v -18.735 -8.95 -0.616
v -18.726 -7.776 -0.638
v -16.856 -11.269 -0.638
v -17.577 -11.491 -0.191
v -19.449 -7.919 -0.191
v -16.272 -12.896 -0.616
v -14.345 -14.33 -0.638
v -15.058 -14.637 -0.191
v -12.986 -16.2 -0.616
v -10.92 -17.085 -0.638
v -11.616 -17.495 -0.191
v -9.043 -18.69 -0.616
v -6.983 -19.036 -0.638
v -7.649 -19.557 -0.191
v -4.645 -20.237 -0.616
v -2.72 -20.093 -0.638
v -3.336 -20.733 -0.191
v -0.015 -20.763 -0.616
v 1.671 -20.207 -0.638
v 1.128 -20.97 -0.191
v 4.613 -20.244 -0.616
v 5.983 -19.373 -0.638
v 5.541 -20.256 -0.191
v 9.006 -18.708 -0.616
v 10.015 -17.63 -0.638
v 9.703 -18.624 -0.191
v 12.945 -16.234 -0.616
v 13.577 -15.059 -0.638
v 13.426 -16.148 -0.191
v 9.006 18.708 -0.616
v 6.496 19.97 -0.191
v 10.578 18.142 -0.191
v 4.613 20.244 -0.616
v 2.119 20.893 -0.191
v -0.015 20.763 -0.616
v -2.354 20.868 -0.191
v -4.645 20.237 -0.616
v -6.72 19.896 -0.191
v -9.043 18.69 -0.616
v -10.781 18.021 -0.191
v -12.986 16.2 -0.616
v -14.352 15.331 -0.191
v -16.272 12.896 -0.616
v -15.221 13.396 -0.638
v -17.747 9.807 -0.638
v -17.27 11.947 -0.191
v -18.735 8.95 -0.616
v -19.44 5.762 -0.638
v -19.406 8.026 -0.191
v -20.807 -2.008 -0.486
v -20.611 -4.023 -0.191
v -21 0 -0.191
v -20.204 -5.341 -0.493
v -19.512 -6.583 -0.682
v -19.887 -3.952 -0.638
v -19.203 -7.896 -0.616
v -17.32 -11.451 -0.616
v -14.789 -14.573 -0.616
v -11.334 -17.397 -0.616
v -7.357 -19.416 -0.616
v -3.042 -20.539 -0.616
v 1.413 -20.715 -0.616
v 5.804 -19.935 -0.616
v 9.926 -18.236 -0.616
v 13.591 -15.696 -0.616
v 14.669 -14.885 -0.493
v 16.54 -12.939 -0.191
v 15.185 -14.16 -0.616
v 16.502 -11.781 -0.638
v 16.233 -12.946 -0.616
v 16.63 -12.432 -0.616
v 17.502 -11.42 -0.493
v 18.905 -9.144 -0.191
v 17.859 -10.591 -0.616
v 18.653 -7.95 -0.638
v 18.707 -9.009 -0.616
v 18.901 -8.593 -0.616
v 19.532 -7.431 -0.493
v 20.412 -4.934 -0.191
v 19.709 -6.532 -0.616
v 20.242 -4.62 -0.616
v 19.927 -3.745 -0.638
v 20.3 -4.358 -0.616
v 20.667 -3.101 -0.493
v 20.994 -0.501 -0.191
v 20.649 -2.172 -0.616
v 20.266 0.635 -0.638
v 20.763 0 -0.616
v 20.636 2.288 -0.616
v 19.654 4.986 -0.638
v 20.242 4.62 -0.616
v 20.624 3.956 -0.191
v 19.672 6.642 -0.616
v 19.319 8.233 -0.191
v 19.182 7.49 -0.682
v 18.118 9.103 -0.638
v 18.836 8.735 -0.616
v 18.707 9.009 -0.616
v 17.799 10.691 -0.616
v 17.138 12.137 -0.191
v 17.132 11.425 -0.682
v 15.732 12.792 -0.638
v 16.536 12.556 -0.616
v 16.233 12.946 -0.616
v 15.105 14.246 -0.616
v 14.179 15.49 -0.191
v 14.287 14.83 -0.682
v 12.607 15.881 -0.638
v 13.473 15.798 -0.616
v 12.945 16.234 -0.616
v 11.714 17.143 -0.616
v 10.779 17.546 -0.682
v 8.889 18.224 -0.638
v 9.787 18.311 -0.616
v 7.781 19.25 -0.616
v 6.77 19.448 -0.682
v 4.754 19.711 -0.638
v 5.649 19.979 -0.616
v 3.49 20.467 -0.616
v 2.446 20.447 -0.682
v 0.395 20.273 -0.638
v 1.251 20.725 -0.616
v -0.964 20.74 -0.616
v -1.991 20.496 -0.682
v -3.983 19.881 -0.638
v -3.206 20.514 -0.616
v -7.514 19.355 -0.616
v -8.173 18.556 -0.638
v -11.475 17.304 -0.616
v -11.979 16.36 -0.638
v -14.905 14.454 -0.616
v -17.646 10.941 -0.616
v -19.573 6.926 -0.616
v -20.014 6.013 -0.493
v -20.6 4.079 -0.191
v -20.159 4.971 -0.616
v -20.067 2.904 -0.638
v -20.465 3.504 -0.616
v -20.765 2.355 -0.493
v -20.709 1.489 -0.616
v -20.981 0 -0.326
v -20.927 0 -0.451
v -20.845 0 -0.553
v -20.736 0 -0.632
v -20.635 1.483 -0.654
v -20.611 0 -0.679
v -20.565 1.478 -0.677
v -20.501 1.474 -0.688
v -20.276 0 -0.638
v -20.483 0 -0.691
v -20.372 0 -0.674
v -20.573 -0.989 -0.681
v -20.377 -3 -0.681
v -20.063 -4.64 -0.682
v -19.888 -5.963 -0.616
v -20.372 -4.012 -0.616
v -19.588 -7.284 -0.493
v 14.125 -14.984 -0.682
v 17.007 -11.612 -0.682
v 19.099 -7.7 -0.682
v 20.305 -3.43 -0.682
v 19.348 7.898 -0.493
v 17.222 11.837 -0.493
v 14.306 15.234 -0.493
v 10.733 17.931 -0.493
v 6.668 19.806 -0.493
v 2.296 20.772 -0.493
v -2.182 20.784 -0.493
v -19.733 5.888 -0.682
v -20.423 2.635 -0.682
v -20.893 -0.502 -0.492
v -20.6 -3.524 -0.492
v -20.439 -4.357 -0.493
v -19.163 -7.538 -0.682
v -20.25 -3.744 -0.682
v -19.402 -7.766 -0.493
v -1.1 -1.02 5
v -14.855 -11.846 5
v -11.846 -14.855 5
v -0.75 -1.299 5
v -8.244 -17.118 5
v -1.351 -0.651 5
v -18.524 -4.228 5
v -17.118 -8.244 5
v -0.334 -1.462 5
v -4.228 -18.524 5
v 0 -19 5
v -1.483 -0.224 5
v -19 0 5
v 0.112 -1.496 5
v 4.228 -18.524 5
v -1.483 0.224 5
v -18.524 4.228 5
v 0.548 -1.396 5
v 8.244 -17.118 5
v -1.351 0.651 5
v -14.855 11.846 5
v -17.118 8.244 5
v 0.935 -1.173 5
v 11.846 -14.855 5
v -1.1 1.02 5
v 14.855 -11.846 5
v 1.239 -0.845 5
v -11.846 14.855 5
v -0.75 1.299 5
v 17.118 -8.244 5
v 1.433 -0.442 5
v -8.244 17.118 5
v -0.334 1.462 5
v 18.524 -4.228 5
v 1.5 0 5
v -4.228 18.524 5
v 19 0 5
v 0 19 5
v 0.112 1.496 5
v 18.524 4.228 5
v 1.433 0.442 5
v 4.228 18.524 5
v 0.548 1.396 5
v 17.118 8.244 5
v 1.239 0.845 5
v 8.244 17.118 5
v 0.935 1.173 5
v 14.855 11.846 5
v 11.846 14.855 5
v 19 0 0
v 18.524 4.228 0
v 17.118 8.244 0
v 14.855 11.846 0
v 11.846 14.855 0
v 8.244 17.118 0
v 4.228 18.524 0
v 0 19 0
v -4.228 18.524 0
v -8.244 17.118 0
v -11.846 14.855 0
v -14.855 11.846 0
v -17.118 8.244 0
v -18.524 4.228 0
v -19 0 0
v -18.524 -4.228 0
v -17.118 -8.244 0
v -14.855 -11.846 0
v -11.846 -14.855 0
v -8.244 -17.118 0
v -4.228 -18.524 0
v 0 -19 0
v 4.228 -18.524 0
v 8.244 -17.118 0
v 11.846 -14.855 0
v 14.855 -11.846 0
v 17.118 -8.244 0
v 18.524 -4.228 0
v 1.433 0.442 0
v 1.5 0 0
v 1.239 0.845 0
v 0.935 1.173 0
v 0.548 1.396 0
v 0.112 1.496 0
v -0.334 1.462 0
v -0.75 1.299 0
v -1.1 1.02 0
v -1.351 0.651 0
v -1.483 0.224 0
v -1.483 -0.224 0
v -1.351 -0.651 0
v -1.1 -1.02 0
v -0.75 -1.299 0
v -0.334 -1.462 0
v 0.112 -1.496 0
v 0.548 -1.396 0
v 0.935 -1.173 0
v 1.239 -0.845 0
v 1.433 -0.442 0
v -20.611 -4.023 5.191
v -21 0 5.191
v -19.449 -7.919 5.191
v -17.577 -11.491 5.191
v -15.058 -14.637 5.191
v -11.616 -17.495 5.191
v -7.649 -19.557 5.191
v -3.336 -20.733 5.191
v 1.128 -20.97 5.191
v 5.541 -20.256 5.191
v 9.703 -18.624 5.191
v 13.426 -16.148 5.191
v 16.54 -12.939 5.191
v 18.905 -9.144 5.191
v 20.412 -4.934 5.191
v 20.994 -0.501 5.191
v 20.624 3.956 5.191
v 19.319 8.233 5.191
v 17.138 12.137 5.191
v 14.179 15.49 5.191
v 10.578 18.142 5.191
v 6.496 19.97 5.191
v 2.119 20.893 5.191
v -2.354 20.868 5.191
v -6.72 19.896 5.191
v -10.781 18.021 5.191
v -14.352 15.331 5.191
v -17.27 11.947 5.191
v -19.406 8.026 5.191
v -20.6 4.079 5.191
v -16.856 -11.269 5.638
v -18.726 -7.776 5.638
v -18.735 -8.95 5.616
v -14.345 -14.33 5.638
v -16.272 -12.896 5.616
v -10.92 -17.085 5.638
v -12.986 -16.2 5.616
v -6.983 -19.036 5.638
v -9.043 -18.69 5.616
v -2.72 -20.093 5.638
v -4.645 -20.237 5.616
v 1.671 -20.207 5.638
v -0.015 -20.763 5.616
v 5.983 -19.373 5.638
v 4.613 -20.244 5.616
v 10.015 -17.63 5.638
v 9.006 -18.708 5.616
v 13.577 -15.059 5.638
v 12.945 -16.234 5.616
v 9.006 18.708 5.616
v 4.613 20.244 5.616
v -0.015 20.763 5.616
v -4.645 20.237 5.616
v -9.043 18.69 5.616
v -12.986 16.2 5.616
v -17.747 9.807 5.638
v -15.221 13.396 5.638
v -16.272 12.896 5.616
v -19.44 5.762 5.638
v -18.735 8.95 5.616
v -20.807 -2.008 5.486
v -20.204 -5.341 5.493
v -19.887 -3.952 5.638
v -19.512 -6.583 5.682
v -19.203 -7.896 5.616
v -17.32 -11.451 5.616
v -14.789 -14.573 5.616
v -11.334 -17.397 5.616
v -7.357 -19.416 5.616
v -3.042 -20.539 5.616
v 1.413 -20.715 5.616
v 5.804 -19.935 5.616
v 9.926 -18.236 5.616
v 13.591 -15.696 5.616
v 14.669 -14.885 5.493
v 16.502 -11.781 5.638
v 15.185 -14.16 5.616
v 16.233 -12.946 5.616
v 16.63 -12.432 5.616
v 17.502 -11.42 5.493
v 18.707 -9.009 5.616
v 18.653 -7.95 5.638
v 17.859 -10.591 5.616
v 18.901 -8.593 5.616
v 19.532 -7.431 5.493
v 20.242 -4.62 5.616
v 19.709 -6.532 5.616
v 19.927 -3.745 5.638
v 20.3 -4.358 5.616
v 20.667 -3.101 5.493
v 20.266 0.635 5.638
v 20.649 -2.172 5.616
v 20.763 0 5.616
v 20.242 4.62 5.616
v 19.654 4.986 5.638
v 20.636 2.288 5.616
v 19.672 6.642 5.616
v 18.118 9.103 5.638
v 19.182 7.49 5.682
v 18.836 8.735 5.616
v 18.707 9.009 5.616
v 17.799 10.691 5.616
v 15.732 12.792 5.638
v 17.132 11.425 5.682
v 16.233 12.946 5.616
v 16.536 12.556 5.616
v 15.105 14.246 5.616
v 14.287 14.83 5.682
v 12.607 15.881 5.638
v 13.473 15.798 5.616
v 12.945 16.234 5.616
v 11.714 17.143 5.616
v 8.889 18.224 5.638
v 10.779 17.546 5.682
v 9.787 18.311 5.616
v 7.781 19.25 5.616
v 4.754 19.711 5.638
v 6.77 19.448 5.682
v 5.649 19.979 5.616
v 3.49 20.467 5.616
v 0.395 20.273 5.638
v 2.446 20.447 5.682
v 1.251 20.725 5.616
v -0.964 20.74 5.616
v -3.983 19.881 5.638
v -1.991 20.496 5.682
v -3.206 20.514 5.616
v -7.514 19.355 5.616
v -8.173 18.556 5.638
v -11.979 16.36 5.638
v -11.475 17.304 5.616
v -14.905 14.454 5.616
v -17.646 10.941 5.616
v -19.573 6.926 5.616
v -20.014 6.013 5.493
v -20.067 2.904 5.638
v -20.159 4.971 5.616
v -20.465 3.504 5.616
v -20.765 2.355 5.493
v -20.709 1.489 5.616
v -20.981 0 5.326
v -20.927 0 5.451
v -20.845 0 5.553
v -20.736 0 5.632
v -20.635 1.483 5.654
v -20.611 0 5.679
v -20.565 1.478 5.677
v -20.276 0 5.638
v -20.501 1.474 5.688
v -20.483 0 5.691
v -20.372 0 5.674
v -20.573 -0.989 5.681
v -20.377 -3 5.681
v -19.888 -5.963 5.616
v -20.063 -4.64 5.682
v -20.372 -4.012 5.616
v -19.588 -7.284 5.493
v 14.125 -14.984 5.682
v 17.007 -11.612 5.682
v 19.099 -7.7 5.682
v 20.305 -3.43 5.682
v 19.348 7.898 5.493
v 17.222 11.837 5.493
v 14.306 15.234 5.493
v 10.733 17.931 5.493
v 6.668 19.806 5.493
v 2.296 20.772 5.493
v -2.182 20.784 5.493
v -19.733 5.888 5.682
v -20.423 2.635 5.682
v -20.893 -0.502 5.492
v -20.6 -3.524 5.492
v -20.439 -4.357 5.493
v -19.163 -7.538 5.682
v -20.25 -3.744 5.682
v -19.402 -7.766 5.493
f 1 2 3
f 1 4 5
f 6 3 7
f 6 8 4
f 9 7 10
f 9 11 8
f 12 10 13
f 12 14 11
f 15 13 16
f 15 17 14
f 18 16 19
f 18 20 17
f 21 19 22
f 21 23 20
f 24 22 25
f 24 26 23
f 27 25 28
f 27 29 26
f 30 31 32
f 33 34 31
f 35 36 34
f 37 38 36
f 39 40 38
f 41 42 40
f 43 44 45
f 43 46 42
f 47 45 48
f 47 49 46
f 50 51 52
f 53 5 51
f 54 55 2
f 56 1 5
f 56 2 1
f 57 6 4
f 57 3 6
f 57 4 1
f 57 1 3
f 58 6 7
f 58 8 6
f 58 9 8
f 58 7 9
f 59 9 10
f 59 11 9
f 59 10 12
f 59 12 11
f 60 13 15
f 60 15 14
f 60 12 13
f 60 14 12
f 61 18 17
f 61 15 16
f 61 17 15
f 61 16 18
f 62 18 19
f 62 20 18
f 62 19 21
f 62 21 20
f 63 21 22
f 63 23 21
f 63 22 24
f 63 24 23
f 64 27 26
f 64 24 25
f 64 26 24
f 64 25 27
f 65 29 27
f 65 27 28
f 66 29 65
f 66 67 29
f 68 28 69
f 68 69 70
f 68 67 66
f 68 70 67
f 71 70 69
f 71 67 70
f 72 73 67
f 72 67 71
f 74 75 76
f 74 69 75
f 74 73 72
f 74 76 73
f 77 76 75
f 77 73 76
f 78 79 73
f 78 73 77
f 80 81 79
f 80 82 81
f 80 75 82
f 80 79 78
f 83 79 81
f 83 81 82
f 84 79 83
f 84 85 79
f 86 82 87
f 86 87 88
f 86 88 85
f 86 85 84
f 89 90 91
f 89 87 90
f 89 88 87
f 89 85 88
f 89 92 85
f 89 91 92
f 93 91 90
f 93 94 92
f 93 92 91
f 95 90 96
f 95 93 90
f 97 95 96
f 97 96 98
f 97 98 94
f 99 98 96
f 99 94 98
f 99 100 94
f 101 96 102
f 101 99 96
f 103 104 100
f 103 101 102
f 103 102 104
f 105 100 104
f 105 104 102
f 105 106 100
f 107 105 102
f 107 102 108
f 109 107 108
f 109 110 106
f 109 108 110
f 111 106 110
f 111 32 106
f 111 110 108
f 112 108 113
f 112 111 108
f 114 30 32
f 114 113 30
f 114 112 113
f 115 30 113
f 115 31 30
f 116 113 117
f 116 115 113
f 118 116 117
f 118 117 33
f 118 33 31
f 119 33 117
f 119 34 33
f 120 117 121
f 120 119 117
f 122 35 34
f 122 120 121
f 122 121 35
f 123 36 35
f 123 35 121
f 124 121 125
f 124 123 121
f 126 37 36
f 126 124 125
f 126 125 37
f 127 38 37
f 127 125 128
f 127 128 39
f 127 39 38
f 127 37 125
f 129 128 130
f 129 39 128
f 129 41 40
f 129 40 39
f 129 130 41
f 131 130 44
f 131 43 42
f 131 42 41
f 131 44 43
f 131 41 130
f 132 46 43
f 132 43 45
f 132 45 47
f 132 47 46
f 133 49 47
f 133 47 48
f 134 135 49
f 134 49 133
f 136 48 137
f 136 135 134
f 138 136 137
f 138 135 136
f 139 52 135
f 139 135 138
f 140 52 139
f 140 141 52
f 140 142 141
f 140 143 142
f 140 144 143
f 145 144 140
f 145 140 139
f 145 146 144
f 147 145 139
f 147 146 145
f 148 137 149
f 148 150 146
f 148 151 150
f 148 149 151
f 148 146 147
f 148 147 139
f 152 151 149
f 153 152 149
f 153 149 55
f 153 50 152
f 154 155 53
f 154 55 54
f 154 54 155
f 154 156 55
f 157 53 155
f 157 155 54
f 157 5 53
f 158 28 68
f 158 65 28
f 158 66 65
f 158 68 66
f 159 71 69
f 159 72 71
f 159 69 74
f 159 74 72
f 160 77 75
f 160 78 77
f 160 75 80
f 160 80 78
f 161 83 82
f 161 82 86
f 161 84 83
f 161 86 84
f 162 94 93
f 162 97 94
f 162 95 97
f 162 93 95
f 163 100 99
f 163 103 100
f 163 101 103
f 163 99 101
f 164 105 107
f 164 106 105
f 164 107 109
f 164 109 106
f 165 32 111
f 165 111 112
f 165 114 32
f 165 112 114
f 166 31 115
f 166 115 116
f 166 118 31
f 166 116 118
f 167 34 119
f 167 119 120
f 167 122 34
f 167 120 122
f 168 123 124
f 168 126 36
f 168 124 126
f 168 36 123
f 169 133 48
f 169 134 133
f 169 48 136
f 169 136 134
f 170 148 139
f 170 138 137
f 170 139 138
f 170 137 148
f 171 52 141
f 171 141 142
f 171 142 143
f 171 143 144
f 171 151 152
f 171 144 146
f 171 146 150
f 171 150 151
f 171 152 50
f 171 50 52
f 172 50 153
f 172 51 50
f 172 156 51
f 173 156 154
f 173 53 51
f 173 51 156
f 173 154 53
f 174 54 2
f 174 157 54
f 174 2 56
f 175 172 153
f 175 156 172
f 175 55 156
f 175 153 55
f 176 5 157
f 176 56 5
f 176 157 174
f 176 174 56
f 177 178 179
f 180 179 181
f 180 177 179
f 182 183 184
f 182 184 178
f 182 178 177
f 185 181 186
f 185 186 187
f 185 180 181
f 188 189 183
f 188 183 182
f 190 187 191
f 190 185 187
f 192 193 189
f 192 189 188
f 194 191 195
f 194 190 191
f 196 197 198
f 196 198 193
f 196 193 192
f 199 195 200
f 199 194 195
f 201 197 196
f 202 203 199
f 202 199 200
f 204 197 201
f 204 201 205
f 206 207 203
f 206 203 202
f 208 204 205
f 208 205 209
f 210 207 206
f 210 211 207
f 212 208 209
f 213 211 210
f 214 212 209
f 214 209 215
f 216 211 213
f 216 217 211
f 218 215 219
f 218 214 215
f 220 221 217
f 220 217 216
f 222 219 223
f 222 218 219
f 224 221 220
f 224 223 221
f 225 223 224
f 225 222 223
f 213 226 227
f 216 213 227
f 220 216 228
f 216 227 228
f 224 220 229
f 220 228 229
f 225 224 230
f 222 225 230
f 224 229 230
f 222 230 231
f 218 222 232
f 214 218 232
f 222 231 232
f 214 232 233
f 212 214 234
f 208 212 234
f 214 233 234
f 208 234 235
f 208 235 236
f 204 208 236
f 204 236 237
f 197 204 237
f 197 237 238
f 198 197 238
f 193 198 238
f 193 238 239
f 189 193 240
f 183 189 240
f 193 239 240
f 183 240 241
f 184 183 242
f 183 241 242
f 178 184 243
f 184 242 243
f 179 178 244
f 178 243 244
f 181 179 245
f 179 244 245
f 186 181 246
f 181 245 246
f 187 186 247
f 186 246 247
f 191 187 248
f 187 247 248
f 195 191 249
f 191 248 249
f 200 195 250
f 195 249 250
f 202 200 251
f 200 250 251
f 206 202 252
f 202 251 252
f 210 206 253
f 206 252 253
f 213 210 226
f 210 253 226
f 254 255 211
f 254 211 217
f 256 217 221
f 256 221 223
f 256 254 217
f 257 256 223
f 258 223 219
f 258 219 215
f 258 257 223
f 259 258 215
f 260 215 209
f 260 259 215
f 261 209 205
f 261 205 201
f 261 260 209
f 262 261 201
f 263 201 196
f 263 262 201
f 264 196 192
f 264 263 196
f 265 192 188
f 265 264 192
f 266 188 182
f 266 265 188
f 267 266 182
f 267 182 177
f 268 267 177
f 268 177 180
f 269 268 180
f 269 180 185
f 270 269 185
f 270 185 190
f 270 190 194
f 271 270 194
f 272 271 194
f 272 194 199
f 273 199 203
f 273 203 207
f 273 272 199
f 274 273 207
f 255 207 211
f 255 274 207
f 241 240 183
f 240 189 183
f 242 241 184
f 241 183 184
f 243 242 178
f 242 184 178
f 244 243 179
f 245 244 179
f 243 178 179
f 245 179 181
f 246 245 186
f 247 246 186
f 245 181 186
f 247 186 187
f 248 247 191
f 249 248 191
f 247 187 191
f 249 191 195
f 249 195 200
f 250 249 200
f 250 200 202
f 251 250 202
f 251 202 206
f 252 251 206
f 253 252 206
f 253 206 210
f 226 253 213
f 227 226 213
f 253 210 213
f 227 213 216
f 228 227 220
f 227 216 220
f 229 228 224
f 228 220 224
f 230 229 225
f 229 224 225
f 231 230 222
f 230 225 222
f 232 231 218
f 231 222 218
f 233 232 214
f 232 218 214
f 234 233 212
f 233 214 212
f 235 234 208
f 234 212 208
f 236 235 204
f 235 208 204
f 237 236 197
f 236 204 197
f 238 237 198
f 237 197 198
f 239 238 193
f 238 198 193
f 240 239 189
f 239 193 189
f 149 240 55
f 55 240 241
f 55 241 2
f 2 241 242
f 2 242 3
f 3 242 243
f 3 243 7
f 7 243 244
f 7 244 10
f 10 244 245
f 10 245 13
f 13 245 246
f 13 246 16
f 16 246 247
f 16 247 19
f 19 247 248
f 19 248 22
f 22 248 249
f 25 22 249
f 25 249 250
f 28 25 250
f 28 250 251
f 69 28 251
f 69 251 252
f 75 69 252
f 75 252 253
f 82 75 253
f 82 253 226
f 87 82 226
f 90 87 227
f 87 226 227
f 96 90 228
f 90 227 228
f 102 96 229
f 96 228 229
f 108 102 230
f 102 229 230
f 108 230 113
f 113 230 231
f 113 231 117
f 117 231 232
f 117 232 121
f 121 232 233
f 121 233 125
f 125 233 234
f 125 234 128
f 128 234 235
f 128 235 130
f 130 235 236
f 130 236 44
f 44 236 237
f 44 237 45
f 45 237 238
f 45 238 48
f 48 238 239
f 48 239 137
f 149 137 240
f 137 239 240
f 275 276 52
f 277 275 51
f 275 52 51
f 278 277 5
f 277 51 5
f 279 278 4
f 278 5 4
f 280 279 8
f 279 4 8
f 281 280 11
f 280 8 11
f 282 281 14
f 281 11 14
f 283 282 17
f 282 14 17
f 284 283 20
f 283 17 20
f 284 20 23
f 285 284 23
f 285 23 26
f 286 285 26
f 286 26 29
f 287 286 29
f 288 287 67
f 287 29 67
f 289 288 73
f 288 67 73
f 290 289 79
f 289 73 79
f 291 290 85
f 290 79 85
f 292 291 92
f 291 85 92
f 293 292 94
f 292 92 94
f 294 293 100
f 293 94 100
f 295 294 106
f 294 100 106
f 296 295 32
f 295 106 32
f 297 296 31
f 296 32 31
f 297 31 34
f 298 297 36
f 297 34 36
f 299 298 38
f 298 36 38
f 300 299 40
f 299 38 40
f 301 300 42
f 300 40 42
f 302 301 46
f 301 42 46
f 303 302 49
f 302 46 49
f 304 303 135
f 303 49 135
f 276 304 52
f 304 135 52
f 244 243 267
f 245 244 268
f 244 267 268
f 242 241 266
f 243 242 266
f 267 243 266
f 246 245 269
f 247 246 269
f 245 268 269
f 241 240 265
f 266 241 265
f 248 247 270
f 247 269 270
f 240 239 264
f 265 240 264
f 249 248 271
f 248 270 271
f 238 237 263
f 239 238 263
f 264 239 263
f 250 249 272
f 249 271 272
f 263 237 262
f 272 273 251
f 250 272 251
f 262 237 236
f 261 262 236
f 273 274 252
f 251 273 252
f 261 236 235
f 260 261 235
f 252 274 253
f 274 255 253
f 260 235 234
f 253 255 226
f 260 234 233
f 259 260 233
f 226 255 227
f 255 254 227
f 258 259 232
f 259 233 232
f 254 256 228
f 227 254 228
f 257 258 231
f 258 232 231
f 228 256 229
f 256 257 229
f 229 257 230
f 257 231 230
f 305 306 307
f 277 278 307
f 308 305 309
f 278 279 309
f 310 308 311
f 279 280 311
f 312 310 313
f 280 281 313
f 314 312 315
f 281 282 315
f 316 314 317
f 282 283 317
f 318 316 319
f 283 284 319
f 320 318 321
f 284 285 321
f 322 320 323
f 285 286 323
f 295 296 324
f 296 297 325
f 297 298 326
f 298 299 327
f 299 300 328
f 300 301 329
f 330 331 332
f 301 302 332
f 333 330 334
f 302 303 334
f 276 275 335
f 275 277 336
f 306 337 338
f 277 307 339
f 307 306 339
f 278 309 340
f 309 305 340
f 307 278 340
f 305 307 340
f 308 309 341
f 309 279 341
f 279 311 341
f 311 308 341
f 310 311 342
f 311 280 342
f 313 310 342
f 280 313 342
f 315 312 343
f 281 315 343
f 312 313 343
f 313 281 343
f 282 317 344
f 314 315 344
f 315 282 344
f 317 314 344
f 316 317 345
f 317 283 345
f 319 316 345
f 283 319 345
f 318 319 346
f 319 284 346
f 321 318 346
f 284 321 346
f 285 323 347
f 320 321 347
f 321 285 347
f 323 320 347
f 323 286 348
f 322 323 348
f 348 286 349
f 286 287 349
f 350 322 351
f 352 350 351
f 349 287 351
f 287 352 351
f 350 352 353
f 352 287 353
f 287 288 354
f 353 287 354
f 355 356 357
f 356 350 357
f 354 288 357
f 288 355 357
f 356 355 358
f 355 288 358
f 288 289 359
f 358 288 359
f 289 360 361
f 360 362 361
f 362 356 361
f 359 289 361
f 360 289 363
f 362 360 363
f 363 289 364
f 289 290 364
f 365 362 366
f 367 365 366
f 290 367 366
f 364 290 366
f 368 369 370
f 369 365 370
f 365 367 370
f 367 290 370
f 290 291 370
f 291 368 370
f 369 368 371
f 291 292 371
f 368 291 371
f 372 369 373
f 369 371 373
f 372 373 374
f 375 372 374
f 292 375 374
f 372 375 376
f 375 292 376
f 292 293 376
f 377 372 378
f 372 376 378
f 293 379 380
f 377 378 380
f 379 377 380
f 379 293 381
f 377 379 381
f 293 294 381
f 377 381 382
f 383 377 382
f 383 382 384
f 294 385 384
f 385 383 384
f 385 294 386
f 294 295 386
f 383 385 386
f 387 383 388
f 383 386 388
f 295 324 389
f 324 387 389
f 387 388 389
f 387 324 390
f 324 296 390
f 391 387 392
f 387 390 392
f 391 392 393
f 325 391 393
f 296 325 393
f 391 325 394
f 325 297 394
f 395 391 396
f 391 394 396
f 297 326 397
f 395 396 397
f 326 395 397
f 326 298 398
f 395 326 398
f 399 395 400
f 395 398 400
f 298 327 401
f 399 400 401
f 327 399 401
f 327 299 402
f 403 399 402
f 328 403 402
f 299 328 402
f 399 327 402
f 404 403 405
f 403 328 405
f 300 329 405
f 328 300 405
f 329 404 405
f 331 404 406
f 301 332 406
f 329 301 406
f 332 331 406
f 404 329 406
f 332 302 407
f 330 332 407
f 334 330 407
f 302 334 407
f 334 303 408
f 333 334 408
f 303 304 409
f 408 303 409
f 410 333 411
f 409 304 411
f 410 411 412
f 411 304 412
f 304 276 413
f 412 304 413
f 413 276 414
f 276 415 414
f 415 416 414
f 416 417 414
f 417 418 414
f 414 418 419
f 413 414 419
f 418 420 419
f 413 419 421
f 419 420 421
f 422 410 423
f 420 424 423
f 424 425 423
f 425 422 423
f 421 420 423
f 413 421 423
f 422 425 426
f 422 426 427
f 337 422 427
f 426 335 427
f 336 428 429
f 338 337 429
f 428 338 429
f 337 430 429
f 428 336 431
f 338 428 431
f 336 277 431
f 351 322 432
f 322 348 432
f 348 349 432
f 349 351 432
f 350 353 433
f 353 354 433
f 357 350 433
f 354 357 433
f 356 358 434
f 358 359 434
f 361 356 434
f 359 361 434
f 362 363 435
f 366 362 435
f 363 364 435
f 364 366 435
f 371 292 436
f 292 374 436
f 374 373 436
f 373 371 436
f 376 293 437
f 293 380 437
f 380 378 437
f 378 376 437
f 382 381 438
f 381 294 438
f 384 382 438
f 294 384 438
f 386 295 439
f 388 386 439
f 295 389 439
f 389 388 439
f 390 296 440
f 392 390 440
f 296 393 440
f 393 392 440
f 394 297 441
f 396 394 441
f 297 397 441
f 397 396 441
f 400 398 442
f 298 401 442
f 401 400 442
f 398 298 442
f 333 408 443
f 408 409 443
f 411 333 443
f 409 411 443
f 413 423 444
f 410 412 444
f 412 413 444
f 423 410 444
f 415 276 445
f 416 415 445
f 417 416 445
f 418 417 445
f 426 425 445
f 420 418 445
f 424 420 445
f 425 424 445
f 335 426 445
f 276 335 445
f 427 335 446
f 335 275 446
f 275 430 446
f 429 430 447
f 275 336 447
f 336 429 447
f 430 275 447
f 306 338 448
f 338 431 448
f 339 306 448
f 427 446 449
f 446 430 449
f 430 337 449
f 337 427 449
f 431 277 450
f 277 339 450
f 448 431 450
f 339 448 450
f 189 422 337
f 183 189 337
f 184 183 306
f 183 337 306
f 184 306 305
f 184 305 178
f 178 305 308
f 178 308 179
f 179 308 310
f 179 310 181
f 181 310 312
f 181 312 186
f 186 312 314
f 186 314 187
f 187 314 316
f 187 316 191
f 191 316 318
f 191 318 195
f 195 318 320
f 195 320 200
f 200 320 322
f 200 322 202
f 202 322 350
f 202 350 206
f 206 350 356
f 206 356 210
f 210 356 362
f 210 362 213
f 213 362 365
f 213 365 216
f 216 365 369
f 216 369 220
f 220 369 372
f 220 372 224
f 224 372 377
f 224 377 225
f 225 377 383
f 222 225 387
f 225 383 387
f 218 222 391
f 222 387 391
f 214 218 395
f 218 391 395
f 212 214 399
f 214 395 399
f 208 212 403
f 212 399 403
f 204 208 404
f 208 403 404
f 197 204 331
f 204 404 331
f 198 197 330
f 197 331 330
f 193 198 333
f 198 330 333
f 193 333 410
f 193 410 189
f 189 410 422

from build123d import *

# Parameters (mm, degrees)
SKETCH1_R           = 19
SKETCH1_R_2         = 1.5
BOSS_EXTRUDE1_DEPTH = 5
FILLET1_R           = 0.5


with BuildPart() as part:
    # Sketch1 → Boss-Extrude1 (new body)
    with BuildSketch(Plane.XY):
        Circle(SKETCH1_R)
        Circle(SKETCH1_R_2, mode=Mode.SUBTRACT)
    extrude(amount=BOSS_EXTRUDE1_DEPTH)


with BuildPart() as body_2:
    # Sketch2 → Revolve2 (revolve)
    with BuildSketch(Plane(origin=(0, 0, 0), x_dir=(1, 0, 0), z_dir=(0, 1, 0)), mode=Mode.PRIVATE) as revolve2_sk:
        Polygon((21, -6), (21, 1), (19, 0), (19, -5), align=None)
    revolve(revolve2_sk.sketch.rotate(Axis((0, 0, 0), (0, 0, 1)), 180), axis=Axis((0, 0, 0), (0, 0, 1)))

    # Fillet1
    fillet1_edges = [body_2.edges().sort_by_distance(p)[0] for p in [
        (21, 0, -1),
        (21, 0, 6),
    ]]
    fillet(fillet1_edges, radius=FILLET1_R)


solid = Compound([part.part, body_2.part])
